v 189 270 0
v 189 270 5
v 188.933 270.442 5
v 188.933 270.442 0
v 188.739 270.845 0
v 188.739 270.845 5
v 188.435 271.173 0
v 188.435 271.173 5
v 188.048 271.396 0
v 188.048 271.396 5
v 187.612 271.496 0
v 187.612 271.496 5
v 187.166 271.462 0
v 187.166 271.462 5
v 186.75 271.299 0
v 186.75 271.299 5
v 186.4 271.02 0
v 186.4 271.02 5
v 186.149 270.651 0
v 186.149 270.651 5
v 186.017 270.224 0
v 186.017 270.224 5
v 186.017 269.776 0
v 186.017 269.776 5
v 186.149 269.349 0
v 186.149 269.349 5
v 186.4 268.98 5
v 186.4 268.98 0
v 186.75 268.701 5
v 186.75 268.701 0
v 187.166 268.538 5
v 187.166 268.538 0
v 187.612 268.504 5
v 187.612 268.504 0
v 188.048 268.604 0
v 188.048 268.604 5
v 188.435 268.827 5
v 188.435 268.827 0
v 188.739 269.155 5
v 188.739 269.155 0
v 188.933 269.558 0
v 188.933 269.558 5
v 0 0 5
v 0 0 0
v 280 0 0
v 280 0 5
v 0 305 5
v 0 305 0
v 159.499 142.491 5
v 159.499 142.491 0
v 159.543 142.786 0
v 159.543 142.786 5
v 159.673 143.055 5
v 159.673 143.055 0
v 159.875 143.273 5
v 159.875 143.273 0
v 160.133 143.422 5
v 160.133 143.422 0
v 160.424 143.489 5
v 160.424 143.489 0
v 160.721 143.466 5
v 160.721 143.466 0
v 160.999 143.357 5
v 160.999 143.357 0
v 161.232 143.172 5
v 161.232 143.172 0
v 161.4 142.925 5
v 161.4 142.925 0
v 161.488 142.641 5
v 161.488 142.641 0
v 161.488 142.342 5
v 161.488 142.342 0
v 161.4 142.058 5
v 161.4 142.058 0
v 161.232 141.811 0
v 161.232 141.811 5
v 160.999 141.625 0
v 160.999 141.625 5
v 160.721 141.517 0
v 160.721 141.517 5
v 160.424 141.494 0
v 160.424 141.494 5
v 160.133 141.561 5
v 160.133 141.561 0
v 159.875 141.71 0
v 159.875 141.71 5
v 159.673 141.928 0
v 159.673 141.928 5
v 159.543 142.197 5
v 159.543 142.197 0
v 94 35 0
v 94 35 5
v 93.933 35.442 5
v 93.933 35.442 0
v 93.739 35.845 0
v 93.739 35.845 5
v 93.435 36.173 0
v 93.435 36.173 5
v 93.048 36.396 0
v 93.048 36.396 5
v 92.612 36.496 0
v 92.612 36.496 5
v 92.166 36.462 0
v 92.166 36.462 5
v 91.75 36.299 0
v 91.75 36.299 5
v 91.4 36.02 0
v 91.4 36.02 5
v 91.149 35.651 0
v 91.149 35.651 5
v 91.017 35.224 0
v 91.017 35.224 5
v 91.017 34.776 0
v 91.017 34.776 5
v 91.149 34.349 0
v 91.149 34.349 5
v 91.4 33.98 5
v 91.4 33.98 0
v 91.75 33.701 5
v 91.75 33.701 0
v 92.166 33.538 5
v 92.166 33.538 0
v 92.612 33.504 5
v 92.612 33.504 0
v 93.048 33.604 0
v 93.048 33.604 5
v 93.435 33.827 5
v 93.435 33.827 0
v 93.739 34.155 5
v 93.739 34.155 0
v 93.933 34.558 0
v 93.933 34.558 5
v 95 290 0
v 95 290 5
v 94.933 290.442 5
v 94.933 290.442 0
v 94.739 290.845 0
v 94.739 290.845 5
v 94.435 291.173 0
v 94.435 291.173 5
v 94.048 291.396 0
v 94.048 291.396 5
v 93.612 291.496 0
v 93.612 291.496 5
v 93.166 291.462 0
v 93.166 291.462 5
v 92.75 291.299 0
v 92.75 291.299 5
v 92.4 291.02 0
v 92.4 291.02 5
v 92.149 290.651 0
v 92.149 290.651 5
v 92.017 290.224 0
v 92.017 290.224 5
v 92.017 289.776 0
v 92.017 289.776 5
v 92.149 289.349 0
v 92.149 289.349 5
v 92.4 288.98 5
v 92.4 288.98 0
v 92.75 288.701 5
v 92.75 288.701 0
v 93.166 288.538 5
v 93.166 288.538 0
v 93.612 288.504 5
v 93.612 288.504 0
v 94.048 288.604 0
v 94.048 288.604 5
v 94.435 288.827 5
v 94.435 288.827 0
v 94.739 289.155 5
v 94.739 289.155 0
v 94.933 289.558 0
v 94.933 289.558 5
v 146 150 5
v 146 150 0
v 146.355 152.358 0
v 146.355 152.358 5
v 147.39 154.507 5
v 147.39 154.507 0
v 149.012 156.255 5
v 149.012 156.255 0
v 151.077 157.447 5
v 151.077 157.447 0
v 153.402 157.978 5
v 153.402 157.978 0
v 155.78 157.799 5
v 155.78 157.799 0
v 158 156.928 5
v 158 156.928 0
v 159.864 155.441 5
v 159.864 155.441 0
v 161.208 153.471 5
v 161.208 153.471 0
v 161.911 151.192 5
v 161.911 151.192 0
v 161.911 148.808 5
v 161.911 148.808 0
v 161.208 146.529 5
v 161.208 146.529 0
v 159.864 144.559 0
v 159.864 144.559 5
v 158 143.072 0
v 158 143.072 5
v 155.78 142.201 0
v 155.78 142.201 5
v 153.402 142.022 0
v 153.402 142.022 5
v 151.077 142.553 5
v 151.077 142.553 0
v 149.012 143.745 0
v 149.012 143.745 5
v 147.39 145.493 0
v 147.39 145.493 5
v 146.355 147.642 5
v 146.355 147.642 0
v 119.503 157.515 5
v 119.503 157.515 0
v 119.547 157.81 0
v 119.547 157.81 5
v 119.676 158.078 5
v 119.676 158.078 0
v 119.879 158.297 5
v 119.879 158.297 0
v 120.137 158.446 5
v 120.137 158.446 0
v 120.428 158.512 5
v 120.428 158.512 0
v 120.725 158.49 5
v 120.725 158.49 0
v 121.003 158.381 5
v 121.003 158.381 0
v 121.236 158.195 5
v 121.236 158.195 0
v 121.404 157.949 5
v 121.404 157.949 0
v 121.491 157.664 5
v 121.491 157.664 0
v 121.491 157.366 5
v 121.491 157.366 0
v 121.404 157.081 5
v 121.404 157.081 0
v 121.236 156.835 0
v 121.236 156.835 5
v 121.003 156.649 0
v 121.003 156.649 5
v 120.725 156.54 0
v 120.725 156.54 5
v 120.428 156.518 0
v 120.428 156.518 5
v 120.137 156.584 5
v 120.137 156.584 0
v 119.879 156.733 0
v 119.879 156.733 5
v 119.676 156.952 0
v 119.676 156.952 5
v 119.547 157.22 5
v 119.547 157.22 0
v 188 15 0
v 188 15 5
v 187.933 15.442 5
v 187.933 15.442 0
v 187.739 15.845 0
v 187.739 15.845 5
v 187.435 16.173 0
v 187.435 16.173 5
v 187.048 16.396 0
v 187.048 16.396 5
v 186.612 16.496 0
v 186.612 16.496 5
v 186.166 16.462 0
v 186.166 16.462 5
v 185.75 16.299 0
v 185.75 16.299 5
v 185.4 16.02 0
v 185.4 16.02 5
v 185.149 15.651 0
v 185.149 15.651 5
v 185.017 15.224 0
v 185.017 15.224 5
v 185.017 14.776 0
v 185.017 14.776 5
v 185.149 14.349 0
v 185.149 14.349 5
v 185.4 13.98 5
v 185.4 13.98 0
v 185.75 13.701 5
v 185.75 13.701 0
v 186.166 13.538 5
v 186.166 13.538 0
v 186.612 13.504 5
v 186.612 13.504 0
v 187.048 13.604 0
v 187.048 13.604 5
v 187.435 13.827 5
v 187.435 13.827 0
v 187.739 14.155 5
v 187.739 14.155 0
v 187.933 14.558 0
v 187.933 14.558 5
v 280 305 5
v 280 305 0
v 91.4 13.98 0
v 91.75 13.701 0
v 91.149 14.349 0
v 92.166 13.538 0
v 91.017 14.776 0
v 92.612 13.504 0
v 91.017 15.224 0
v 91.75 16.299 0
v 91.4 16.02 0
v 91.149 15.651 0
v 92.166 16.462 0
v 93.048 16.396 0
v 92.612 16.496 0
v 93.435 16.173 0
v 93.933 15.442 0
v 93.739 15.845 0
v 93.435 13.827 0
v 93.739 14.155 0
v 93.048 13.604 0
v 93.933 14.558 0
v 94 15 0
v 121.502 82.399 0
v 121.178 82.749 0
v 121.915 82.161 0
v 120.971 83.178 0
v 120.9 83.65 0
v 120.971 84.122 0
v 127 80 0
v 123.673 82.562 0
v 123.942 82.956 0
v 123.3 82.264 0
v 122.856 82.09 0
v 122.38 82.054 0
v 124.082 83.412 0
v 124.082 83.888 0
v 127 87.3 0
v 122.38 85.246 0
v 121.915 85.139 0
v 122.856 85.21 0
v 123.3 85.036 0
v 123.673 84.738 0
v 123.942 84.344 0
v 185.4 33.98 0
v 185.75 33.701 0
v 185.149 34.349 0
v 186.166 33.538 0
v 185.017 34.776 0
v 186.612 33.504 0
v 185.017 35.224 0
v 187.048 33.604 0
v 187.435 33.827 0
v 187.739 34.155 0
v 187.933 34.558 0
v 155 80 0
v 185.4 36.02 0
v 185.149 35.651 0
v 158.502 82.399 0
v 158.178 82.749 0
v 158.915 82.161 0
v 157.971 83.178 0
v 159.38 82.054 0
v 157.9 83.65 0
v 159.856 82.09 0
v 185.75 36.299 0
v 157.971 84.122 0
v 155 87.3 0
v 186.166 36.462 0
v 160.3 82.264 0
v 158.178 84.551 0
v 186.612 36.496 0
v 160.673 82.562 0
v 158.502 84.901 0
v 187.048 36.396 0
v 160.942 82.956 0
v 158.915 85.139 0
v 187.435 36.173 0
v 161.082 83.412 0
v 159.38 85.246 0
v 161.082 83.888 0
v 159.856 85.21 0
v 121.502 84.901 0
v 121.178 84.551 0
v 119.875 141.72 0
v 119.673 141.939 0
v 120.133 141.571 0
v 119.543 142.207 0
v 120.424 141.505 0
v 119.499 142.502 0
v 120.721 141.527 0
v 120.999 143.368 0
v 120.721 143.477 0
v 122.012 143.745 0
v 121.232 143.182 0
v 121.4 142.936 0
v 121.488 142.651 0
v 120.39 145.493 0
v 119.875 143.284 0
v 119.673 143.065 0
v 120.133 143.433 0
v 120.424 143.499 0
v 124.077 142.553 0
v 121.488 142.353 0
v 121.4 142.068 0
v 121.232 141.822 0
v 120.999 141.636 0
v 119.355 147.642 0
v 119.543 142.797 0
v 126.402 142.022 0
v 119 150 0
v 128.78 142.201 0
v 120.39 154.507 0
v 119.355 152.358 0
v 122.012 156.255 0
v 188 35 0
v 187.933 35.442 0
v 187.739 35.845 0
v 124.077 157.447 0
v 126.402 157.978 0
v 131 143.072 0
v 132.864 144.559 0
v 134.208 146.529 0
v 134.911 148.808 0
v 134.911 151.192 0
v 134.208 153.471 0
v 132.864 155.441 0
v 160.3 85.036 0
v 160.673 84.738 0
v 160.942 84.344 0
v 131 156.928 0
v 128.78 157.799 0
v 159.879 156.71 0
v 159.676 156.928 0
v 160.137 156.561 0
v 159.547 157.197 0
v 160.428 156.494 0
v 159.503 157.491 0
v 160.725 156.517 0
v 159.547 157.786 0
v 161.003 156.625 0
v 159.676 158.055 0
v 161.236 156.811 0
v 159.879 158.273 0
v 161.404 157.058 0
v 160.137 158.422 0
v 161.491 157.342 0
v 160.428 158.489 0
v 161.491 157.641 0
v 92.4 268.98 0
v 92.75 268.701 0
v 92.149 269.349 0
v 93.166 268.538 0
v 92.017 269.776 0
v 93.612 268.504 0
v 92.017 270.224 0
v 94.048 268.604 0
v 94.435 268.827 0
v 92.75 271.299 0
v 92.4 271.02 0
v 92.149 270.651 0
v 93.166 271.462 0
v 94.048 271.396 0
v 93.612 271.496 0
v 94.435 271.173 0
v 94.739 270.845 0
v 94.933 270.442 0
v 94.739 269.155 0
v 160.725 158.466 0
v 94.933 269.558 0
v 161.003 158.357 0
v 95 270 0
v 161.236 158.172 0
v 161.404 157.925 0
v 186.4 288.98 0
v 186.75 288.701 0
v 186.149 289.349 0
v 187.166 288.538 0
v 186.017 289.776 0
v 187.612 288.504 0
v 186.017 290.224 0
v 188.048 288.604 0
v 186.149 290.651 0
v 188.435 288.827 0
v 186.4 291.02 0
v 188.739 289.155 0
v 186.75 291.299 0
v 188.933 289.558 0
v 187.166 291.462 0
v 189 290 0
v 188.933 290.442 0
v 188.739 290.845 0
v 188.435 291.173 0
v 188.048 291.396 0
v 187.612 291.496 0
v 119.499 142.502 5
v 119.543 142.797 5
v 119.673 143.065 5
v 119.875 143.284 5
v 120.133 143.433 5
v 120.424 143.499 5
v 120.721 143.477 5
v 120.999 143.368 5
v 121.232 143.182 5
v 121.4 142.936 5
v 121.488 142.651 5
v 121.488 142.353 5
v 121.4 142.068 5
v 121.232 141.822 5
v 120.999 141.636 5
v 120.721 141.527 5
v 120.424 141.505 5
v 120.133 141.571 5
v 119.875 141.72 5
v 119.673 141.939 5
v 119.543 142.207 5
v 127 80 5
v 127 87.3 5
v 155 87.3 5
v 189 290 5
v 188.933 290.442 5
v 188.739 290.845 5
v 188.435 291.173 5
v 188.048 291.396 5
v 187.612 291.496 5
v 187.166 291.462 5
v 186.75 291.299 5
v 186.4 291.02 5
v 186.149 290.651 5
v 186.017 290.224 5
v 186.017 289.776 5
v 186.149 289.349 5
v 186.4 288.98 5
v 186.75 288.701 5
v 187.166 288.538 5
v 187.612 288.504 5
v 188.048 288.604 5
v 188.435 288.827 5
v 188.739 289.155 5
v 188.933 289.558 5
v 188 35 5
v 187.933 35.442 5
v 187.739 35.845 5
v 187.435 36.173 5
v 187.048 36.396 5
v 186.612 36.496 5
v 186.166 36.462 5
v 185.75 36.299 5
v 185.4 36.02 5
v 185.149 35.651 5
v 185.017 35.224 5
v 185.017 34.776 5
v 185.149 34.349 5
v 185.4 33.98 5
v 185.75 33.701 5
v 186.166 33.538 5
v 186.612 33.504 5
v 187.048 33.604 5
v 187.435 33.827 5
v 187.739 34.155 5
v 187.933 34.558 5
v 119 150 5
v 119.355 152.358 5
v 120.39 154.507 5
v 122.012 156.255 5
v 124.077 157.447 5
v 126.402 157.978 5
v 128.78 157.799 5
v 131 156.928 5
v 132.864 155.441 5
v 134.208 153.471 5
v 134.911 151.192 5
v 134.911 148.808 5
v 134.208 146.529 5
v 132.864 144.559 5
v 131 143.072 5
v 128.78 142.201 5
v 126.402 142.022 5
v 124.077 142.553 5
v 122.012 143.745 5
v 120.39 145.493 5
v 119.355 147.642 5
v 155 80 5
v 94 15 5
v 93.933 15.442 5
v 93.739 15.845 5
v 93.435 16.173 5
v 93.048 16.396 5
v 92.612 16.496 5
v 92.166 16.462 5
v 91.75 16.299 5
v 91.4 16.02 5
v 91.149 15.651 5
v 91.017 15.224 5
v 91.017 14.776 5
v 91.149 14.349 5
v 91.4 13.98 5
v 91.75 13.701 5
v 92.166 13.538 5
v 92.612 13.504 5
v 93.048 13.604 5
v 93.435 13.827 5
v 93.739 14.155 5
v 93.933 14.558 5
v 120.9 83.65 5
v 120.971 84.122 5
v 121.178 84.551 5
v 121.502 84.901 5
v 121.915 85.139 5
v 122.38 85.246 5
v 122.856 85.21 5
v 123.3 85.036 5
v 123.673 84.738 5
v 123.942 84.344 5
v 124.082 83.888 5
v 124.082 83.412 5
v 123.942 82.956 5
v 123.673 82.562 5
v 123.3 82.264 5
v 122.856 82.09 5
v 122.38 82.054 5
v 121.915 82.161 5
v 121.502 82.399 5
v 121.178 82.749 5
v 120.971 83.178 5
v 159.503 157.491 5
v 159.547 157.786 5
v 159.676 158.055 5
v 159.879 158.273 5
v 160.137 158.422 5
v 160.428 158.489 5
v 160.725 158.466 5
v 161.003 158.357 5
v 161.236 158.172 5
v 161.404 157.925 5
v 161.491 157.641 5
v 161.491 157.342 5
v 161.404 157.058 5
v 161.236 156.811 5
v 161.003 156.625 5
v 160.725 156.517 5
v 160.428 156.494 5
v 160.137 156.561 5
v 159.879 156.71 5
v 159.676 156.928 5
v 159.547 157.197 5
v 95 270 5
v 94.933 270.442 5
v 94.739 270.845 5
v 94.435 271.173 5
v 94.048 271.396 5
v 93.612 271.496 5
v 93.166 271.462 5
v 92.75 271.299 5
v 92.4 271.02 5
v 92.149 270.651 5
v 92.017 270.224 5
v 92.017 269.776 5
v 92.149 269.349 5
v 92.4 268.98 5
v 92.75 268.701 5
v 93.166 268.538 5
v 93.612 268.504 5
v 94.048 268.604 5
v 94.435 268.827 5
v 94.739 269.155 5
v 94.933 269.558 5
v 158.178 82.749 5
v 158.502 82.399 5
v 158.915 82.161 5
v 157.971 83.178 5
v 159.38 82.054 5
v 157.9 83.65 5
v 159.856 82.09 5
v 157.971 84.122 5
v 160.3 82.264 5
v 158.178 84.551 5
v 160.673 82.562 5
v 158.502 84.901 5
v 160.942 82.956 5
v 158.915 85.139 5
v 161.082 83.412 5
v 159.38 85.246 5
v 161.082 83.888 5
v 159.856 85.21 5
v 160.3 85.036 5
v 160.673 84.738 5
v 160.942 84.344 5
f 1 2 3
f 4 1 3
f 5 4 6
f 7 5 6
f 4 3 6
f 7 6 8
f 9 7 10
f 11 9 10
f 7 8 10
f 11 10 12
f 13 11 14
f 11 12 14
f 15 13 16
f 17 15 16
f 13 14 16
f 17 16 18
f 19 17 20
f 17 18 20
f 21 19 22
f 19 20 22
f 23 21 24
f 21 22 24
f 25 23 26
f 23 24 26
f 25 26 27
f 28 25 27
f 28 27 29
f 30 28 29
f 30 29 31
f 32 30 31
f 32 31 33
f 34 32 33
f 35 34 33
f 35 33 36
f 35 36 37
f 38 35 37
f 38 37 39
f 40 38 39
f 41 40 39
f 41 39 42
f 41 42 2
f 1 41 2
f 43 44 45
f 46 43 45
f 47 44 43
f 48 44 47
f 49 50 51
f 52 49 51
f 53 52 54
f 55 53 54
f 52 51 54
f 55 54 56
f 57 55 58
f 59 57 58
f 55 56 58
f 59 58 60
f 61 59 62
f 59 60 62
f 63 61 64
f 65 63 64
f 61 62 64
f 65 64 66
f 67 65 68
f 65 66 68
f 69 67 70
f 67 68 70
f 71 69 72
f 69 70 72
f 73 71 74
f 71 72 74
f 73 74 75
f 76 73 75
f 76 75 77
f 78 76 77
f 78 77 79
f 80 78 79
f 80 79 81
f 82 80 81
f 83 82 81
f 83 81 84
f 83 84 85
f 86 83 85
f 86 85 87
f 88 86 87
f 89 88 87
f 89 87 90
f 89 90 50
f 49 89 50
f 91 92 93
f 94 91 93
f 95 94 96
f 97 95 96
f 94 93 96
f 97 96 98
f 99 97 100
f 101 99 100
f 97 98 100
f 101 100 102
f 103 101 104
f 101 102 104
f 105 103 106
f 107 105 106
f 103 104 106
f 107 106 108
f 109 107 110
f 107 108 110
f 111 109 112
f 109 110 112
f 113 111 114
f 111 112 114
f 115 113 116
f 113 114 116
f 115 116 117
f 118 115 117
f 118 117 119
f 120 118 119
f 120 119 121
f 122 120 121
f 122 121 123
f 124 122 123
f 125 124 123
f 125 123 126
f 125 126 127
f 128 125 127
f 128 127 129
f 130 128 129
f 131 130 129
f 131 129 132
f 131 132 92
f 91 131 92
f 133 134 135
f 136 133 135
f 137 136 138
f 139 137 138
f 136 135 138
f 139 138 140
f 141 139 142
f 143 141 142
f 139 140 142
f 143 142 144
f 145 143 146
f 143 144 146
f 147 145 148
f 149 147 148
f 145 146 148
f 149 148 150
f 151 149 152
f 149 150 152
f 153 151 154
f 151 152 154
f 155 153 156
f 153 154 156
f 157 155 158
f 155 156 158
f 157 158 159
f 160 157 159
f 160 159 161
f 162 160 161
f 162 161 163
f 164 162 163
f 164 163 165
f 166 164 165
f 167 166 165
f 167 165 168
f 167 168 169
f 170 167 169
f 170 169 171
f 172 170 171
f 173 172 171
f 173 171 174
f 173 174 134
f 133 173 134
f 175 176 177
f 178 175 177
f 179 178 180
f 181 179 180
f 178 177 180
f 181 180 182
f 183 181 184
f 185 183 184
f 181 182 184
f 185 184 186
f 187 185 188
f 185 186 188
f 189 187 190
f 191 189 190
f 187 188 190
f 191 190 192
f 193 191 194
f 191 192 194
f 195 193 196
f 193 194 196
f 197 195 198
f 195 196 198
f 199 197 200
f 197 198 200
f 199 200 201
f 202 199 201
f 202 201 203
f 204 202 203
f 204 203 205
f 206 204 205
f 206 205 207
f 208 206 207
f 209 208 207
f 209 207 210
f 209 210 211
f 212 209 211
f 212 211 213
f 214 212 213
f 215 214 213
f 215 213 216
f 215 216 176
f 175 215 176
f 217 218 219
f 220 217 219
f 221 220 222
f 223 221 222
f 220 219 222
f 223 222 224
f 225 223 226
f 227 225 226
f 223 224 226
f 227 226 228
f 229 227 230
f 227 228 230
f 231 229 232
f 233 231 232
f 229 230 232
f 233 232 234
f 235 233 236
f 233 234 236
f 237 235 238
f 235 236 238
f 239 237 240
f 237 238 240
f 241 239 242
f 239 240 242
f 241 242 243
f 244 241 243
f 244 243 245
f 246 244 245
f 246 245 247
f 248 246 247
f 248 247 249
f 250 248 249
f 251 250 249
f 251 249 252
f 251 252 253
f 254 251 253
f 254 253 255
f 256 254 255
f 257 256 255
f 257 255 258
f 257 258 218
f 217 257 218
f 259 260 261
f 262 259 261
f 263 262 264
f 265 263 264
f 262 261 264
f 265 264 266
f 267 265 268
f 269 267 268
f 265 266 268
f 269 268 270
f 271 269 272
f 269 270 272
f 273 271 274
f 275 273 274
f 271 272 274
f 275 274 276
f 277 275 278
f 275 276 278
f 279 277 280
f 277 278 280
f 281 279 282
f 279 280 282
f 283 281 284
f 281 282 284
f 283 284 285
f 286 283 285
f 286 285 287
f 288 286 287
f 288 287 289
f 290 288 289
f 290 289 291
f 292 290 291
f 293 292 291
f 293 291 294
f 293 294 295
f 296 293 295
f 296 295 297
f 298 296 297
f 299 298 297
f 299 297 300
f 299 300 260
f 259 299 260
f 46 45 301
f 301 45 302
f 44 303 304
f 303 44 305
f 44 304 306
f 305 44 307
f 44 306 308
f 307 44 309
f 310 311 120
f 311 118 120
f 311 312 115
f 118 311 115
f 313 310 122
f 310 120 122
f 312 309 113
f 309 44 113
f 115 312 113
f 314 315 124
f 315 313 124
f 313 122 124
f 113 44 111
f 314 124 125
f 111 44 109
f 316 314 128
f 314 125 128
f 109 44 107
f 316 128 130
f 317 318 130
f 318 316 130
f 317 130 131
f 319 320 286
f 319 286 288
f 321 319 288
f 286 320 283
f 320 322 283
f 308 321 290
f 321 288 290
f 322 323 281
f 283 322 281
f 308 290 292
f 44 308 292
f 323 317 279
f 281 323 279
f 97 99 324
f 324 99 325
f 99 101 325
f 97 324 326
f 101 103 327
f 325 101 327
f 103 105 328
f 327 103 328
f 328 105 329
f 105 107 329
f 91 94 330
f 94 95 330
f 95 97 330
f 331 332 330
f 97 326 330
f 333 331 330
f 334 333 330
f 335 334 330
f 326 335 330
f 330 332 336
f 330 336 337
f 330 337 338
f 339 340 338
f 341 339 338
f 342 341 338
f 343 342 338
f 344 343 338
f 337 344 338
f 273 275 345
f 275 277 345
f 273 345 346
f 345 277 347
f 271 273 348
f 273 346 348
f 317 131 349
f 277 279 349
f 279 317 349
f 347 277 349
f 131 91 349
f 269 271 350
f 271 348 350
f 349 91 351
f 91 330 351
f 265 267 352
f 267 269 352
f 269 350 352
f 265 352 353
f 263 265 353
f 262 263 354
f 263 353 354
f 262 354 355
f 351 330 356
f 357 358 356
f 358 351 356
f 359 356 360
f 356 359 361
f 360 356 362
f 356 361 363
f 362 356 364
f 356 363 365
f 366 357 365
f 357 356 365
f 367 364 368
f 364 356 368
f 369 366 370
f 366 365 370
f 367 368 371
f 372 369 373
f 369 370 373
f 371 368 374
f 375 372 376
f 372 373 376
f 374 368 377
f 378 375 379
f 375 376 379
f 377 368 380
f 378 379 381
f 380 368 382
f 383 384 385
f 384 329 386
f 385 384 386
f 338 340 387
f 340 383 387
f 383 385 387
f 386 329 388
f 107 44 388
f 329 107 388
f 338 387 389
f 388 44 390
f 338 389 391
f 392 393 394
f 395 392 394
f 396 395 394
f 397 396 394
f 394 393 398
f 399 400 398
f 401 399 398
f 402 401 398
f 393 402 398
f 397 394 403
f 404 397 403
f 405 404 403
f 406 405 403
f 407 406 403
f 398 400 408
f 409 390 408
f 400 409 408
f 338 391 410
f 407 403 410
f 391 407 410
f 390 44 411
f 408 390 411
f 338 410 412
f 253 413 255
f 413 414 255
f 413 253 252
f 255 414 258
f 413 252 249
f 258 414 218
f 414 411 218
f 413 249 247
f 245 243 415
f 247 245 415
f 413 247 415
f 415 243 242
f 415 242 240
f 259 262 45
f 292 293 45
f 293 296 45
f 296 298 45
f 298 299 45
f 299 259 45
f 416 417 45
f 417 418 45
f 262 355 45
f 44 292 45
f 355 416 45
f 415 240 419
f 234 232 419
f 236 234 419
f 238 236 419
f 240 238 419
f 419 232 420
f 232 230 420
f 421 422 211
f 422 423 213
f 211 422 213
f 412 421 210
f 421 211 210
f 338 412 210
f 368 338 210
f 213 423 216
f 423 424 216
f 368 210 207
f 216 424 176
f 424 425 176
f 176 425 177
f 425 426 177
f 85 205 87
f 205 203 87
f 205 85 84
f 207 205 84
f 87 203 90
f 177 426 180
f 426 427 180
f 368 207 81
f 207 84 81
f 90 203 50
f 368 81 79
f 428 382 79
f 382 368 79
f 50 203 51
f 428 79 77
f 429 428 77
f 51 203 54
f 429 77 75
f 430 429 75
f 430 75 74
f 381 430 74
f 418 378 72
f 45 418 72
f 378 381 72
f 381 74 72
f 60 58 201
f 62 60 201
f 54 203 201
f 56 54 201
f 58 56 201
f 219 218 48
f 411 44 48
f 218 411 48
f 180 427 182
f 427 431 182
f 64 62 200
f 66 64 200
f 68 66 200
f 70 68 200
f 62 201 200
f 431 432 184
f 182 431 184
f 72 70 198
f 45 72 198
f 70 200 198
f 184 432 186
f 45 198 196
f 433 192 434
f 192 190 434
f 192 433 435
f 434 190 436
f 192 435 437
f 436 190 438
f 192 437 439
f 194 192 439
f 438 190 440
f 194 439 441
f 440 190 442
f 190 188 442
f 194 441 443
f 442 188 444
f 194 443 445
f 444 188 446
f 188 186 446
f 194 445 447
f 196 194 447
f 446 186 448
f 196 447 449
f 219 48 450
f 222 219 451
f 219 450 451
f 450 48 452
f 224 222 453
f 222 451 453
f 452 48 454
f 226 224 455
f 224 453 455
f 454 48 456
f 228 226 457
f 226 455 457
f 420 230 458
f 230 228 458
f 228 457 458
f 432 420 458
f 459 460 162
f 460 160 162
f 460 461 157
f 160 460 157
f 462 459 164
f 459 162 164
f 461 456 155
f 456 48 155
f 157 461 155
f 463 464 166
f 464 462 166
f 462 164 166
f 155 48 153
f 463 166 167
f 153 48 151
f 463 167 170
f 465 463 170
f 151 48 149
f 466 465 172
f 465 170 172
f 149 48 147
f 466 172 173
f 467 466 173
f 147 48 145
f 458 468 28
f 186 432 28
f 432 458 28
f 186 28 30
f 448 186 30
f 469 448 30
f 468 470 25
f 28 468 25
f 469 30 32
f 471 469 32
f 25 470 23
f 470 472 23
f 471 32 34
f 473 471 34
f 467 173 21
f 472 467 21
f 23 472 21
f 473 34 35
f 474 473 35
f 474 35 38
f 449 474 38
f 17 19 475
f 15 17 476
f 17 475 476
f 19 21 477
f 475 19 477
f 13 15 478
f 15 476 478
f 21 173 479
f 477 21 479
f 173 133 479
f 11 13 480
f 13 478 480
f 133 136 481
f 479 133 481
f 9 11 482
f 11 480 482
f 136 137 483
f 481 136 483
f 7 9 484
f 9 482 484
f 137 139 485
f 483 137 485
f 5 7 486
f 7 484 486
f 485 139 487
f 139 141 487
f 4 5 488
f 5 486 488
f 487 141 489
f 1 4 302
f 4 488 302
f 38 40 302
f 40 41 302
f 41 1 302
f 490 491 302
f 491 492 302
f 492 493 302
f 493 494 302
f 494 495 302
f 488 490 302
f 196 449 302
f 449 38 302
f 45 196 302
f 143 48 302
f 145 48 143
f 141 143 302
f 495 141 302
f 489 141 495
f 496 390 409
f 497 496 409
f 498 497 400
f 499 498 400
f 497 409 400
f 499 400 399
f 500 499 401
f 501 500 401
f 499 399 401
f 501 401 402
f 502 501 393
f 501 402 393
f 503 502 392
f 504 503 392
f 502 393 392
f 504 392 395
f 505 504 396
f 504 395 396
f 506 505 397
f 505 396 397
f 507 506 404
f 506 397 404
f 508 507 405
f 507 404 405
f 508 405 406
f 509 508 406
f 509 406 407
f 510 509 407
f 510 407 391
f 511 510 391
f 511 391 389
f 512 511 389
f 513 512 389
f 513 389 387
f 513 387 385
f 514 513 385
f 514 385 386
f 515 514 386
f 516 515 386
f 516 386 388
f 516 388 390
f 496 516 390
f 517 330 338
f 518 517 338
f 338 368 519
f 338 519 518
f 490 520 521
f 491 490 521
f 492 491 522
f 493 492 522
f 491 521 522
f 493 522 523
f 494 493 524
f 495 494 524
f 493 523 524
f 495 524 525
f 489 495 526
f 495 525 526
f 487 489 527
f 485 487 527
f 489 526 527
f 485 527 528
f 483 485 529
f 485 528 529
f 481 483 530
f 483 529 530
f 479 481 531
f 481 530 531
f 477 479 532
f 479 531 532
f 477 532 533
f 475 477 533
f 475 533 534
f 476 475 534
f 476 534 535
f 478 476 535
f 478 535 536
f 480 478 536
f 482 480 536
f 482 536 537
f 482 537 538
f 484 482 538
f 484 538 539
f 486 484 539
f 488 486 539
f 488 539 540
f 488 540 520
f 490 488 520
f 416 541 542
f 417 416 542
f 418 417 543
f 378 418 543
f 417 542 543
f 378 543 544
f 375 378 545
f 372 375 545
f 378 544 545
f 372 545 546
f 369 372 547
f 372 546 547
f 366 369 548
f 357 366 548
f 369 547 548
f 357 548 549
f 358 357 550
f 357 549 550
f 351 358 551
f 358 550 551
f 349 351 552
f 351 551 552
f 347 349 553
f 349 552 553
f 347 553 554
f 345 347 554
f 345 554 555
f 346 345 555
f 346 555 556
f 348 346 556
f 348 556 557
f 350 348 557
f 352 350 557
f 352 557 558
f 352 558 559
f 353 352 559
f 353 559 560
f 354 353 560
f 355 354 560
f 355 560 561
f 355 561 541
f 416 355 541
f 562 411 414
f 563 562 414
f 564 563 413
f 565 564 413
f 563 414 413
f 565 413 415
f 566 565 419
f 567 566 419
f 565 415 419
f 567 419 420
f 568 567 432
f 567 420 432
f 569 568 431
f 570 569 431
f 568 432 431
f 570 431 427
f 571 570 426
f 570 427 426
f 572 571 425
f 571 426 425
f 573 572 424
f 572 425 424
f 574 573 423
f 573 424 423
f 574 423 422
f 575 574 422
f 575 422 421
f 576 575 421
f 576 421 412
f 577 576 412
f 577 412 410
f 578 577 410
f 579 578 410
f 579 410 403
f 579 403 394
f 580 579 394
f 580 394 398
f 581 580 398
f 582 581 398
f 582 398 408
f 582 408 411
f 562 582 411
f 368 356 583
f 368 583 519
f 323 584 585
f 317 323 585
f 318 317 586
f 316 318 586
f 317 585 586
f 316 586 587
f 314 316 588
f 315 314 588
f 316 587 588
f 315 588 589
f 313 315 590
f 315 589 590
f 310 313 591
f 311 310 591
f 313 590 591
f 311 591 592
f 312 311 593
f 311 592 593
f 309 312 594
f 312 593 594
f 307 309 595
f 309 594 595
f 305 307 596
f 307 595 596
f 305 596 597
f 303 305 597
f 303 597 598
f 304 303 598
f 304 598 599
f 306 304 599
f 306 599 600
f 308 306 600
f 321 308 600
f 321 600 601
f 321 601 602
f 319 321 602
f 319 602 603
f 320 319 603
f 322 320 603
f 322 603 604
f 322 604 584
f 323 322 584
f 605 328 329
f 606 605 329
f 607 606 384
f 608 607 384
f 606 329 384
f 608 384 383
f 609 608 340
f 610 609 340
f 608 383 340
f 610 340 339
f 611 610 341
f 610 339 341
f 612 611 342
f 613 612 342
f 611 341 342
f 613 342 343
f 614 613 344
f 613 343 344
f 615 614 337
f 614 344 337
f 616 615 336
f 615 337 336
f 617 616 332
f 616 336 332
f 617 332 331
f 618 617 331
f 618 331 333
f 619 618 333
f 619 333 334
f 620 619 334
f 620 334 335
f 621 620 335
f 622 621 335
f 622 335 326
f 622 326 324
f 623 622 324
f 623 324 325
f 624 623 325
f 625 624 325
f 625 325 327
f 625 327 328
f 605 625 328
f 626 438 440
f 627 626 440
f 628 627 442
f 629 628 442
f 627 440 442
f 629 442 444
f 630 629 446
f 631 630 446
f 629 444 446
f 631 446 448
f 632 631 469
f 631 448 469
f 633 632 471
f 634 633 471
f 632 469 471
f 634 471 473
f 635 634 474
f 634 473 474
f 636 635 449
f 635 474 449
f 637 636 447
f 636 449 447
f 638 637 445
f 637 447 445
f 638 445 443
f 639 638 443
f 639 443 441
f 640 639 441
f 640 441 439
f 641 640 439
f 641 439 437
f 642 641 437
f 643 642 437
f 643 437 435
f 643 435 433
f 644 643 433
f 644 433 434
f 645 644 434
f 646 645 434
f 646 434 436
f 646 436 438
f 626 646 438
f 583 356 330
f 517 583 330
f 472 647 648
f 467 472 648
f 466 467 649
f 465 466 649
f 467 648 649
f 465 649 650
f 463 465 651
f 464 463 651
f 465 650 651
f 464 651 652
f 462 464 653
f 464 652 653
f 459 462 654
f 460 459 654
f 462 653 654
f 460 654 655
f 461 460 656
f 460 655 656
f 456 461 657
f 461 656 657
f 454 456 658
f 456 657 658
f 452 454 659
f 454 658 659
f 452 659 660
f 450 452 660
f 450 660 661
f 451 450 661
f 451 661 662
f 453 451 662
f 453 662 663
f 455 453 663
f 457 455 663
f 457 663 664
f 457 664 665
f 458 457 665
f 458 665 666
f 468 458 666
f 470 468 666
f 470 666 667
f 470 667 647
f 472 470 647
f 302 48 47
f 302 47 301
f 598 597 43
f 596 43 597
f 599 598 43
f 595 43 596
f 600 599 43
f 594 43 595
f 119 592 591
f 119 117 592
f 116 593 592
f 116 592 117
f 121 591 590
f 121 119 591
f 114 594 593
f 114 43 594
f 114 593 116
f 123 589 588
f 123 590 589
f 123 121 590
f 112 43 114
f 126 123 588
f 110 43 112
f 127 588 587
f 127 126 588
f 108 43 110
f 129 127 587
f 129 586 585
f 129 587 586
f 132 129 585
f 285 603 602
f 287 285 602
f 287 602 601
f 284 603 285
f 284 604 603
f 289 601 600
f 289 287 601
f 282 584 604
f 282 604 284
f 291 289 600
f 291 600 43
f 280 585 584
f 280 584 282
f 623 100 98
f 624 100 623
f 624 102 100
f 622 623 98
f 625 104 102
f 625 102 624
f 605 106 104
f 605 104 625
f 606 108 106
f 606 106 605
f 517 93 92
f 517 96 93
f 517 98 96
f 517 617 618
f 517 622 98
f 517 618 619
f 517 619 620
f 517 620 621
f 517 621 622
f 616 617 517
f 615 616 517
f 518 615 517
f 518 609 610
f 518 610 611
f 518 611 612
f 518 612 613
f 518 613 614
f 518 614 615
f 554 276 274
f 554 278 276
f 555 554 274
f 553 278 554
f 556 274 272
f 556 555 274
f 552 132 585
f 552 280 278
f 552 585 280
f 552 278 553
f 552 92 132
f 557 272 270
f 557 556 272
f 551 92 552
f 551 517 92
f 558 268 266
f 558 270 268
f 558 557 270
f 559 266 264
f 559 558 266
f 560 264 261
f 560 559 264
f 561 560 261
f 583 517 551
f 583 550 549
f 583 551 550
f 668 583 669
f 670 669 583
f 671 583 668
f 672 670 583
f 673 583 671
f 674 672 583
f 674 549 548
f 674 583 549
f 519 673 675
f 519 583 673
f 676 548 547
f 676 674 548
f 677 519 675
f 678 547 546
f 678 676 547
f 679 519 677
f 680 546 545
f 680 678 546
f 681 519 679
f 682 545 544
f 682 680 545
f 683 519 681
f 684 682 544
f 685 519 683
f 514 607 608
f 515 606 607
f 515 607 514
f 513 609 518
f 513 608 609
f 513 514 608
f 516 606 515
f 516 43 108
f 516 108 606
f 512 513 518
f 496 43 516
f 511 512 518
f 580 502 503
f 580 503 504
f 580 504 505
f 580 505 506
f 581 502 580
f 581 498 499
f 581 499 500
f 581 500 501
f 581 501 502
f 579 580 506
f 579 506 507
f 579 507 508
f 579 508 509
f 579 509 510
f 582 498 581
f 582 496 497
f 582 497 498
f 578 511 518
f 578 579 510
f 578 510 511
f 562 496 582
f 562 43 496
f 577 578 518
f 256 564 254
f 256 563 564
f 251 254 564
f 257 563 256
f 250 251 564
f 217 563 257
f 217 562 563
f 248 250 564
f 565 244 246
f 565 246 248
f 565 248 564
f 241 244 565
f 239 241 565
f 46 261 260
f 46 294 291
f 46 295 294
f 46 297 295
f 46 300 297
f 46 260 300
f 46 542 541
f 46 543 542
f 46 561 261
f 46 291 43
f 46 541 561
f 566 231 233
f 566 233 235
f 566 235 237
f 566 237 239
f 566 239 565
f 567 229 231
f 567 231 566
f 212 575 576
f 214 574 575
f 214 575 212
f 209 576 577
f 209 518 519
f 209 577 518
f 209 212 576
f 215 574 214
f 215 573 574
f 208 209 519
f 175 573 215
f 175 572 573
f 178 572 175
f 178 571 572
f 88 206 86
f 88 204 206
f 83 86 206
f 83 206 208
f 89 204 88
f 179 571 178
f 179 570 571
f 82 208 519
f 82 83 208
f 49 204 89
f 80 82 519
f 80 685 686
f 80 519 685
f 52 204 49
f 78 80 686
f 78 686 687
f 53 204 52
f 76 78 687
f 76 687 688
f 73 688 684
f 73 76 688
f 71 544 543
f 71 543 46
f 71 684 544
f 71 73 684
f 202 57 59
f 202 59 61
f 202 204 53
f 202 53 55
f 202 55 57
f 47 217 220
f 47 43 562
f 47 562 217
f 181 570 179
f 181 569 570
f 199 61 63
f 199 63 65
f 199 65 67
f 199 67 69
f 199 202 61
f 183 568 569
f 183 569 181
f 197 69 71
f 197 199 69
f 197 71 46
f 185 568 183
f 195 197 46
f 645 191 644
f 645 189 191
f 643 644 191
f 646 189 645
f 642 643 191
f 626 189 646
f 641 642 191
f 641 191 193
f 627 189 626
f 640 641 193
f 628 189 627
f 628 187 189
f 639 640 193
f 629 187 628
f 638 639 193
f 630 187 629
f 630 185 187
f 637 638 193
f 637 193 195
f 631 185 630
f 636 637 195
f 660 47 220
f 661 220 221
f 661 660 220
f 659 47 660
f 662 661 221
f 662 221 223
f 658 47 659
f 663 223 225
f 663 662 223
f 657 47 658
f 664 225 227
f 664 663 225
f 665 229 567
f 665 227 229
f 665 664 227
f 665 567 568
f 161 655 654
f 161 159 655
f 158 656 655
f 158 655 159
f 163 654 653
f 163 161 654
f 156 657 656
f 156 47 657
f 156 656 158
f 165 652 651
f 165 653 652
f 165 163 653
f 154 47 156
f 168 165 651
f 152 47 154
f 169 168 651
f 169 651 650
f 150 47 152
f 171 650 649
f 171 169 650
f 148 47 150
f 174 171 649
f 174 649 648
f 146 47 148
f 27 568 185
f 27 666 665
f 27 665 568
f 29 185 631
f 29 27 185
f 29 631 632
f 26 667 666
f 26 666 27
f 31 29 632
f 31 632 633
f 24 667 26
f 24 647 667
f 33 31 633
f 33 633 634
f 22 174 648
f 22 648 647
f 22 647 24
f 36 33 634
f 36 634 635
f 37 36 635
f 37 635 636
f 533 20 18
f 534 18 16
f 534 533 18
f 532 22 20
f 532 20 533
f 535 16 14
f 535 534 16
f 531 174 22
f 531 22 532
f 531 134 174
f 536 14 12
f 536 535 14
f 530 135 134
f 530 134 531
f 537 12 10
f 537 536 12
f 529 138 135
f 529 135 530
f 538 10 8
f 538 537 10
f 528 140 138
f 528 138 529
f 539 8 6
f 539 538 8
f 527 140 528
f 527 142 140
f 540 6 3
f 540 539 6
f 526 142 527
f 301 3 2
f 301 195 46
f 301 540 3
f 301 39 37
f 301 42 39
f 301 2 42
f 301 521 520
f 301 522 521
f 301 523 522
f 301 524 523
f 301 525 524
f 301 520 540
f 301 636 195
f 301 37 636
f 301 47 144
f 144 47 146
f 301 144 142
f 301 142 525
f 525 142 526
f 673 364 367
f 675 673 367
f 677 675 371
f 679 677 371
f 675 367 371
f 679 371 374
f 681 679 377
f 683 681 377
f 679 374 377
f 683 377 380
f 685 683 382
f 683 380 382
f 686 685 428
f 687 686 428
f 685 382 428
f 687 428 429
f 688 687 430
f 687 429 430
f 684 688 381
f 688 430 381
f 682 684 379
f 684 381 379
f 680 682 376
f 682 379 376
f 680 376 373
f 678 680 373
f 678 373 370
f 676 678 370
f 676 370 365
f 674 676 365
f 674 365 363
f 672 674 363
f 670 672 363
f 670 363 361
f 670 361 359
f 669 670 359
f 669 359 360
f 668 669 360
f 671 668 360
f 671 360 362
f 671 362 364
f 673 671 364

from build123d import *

# Parameters (mm, degrees)
ESQUISSE1_W             = 280
ESQUISSE1_H             = 305
BOSS_EXTRU_1_DEPTH      = 5
ESQUISSE2_R             = 1.5
ENL_V_MAT_EXTRU_1_DEPTH = 415.065212255
ESQUISSE3_R             = 1.5
ENL_V_MAT_EXTRU_2_DEPTH = 415.065212255
ESQUISSE4_R             = 1.6
ESQUISSE4_W             = 28
ESQUISSE4_H             = 7.3
ENL_V_MAT_EXTRU_3_DEPTH = 415.065212255
ESQUISSE5_R             = 8
ESQUISSE5_R_2           = 1
ENL_V_MAT_EXTRU_4_DEPTH = 415.065212255


with BuildPart() as part:
    # Esquisse1 → Boss.-Extru.1 (new body)
    with BuildSketch(Plane.XY):
        with Locations((140, 152.5)):
            Rectangle(ESQUISSE1_W, ESQUISSE1_H)
    extrude(amount=BOSS_EXTRU_1_DEPTH)

    # Esquisse2 → Enlèv. mat.-Extru.1 (cut, through all)
    with BuildSketch(Plane.XY.offset(5)):
        with Locations((92.5, 35)):
            Circle(ESQUISSE2_R)
        with Locations((92.5, 15)):
            Circle(ESQUISSE2_R)
        with Locations((186.5, 35)):
            Circle(ESQUISSE2_R)
        with Locations((186.5, 15)):
            Circle(ESQUISSE2_R)
    extrude(amount=-ENL_V_MAT_EXTRU_1_DEPTH, mode=Mode.SUBTRACT)

    # Esquisse3 → Enlèv. mat.-Extru.2 (cut, through all)
    with BuildSketch(Plane.XY.offset(5)):
        with Locations((187.5, 270)):
            Circle(ESQUISSE3_R)
        with Locations((187.5, 290)):
            Circle(ESQUISSE3_R)
        with Locations((93.5, 270)):
            Circle(ESQUISSE3_R)
        with Locations((93.5, 290)):
            Circle(ESQUISSE3_R)
    extrude(amount=-ENL_V_MAT_EXTRU_2_DEPTH, mode=Mode.SUBTRACT)

    # Esquisse4 → Enlèv. mat.-Extru.3 (cut, through all)
    with BuildSketch(Plane(origin=(0, 0, 0), x_dir=(-1, 0, 0), z_dir=(0, 0, -1))):
        with Locations((-159.5, 83.65)):
            Circle(ESQUISSE4_R)
        with Locations((-122.5, 83.65)):
            Circle(ESQUISSE4_R)
        with Locations((-141, 83.65)):
            Rectangle(ESQUISSE4_W, ESQUISSE4_H)
    extrude(amount=-ENL_V_MAT_EXTRU_3_DEPTH, mode=Mode.SUBTRACT)

    # Esquisse5 → Enlèv. mat.-Extru.4 (cut, through all)
    with BuildSketch(Plane(origin=(0, 0, 0), x_dir=(-1, 0, 0), z_dir=(0, 0, -1))):
        with Locations((-154, 150)):
            Circle(ESQUISSE5_R)
        with Locations((-127, 150)):
            Circle(ESQUISSE5_R)
        with Locations((-160.502638889, 157.491467645)):
            Circle(ESQUISSE5_R_2)
        with Locations((-120.502645848, 157.515062528)):
            Circle(ESQUISSE5_R_2)
        with Locations((-120.498818515, 142.502017666)):
            Circle(ESQUISSE5_R_2)
        with Locations((-160.498818515, 142.491467645)):
            Circle(ESQUISSE5_R_2)
    extrude(amount=-ENL_V_MAT_EXTRU_4_DEPTH, mode=Mode.SUBTRACT)


solid = part.part
